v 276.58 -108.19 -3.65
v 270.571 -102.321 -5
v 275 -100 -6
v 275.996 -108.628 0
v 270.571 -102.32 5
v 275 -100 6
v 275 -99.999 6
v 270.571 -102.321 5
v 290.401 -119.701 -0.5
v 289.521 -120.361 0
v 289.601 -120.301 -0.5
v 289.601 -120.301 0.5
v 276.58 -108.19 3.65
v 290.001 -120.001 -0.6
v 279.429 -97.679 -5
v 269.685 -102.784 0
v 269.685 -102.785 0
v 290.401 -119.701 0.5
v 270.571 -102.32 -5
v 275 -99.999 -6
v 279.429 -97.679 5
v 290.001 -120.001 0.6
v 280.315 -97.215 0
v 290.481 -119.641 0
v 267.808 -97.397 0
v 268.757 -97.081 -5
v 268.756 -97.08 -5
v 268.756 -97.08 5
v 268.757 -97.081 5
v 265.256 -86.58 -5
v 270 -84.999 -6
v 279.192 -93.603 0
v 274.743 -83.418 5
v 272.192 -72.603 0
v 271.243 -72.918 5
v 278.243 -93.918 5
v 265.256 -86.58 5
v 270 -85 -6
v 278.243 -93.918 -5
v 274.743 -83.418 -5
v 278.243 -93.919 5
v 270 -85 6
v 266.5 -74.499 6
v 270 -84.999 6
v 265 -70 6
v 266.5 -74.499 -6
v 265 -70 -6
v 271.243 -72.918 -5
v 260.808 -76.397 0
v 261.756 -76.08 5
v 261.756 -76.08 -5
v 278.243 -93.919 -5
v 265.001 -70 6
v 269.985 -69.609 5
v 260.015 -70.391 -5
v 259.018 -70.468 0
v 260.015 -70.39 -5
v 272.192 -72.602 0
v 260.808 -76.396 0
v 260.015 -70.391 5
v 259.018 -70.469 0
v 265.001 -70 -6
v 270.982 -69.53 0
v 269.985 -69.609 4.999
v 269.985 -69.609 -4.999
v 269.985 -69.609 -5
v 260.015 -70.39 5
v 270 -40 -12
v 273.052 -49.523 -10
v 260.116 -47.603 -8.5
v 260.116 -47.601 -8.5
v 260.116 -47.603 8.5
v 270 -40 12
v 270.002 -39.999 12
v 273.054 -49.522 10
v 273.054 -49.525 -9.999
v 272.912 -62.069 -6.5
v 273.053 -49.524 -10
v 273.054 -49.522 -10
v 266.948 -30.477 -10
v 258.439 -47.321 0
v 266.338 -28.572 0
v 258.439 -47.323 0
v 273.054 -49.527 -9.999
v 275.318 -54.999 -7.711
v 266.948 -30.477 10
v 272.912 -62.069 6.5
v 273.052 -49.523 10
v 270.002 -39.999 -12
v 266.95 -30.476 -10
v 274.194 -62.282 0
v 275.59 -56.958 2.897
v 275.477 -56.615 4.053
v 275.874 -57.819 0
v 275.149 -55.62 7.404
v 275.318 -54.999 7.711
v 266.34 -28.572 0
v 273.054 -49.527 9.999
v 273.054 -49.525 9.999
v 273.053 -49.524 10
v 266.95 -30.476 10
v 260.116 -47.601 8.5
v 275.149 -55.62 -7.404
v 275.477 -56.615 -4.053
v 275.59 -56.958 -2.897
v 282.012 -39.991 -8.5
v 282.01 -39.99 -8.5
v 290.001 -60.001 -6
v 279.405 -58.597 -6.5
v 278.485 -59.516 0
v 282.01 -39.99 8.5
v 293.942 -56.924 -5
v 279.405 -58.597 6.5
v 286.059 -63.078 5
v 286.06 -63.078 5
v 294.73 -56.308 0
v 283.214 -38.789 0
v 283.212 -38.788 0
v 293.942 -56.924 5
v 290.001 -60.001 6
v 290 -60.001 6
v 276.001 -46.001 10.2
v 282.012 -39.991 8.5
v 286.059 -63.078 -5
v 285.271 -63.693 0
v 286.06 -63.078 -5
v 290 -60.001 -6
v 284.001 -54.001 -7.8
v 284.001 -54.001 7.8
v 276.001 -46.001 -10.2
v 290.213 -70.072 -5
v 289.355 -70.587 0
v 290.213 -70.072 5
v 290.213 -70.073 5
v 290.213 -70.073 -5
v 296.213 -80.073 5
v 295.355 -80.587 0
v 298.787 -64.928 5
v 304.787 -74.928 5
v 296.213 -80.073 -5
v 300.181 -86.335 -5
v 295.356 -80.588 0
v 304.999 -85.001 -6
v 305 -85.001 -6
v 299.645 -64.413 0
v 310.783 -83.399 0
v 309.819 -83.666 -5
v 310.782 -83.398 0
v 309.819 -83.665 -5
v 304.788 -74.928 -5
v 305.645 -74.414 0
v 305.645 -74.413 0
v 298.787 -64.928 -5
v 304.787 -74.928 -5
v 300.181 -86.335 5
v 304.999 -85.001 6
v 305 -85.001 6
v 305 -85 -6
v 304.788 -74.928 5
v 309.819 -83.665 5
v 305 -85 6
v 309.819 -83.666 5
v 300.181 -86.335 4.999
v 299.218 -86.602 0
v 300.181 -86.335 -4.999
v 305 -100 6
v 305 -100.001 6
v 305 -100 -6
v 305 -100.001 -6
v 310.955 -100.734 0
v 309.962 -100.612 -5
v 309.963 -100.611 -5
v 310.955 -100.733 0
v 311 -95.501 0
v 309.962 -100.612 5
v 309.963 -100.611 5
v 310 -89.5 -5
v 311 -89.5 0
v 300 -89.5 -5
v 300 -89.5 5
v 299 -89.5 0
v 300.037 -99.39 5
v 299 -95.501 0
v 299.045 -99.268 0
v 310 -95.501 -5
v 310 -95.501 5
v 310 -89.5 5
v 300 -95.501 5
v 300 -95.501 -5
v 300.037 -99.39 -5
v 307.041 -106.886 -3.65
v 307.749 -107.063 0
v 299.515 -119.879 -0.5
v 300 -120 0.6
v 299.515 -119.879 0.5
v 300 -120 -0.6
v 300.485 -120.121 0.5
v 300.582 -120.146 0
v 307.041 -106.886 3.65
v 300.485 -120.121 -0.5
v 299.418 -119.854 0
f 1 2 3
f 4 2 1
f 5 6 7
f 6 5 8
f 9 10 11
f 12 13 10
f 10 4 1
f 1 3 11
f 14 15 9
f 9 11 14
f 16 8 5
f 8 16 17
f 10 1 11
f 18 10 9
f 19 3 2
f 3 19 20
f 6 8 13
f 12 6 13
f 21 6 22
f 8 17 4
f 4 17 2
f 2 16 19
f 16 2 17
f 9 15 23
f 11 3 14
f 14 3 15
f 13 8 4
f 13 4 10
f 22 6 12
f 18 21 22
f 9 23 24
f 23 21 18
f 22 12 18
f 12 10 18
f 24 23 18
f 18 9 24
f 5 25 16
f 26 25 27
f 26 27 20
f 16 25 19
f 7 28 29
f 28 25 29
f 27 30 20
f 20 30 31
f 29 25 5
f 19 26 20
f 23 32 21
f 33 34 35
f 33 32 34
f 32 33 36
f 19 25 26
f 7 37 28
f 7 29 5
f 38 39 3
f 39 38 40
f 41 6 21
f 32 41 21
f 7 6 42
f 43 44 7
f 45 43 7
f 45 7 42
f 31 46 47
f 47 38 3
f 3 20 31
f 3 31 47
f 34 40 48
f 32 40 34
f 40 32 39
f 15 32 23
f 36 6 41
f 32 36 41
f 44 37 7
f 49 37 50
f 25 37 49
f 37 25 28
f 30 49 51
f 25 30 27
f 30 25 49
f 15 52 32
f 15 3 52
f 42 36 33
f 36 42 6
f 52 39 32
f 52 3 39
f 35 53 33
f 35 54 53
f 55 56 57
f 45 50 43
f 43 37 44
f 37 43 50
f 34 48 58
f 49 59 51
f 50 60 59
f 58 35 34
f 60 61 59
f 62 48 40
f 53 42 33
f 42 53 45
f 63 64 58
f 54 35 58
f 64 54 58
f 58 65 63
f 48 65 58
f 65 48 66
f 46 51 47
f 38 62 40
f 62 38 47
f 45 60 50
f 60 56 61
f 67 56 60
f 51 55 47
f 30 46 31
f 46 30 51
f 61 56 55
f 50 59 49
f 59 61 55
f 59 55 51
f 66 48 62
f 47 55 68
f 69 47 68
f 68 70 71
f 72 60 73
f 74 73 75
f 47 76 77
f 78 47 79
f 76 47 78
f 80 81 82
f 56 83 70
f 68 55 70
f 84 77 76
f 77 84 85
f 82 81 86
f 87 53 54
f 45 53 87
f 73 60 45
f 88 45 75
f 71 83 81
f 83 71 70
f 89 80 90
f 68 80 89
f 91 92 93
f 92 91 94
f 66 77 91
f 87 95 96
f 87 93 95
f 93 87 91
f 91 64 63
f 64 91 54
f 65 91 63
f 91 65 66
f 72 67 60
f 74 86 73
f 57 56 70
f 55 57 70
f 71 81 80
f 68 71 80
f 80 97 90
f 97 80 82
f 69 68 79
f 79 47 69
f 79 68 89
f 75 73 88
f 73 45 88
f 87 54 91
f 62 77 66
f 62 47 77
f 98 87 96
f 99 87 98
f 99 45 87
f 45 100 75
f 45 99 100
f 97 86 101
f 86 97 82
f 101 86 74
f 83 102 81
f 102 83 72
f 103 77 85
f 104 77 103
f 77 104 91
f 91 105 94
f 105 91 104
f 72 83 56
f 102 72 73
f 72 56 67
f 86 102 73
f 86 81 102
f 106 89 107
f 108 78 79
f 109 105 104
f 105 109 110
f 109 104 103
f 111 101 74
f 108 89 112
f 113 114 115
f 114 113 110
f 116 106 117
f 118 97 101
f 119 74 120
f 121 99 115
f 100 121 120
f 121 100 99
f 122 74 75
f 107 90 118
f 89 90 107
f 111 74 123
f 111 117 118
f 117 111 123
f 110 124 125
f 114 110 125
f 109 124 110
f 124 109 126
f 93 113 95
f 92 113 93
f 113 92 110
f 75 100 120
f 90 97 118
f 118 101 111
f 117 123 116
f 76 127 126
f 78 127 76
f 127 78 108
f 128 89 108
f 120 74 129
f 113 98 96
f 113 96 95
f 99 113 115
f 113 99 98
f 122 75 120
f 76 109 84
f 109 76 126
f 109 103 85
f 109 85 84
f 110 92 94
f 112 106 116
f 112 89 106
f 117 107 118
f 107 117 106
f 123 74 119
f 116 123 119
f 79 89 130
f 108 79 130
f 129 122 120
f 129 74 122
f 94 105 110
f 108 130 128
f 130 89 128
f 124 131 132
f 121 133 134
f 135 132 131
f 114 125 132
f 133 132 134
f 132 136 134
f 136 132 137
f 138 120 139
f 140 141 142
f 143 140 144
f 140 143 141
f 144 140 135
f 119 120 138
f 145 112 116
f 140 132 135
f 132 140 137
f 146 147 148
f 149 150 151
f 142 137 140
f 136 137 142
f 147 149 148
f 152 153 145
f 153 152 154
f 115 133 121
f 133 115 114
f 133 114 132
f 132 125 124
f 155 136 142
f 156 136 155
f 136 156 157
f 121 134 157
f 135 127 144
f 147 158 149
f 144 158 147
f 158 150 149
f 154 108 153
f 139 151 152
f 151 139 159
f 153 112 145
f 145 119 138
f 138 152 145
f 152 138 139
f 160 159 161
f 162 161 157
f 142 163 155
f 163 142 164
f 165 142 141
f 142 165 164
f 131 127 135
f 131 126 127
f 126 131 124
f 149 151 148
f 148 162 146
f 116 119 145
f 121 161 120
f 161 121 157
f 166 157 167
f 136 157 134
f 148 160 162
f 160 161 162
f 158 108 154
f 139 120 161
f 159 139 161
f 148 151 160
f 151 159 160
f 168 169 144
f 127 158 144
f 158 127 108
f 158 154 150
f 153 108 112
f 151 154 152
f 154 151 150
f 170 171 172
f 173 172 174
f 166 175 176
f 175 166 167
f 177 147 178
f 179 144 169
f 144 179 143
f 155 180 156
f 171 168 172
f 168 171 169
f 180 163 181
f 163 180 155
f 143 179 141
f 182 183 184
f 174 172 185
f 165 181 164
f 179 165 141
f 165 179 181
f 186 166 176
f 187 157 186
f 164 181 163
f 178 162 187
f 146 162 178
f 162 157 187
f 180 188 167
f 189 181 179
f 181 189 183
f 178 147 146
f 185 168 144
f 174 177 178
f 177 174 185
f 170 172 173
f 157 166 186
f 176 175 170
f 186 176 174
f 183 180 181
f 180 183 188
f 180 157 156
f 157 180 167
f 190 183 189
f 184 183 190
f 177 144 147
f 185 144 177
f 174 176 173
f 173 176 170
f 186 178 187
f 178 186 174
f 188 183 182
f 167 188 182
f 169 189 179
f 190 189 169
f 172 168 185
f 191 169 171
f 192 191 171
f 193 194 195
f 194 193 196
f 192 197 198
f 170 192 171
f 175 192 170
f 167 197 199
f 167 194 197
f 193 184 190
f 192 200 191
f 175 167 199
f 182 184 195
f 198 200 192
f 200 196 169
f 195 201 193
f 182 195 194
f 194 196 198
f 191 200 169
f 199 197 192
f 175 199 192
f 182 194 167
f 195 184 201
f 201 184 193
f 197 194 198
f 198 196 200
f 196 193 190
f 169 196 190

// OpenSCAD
Leg = [
    [290,  -120,0,[0.1,0.1,0-1]], //claw
  [275,  -100,0,[1,1,1]],// Tarsomeres
  [270,  -85,0,[1,1,1]],// Tarsomeres
  [265,  -70,0,[1,1,1]],// Tarsomeres

  [270,-40, 0, [2,2,2]],//Tarsus
  [290,  -60,0,[1,1,1]],// Tarsomeres
  [305,  -85,0,[1,1,1]],// Tarsomeres
  [305,  -100,0,[1,1,1]],// Tarsomeres
 [300,  -120,0,[0.1,0.1,0-1]], //claw
];


profile = [
  [5, 5],
  [0,6],
[-5, 5],
[-6,0],
[-5, -5],
[0,-6],
[5, -5],
[6,0]
];


bodypart ( profile, Leg );
    

module bodypart(profile, List, grove=1,lrp1=0.3,lrp2=0.7) {
    lrp0=0;
    lrp3=1;
   sth = 0.001;
  for(i = [0: len(List) - 2]) {
    hull() {
      if(i == 0) {
          
color("red")
ttranslate(List[i]) rotate(getangle(v(i,List)))  scale(lerp(List[i][3],List[i+1][3],lrp0)) scale(grove)  linear_extrude(height = sth) polygon(profile);
ttranslate(lerp(List[i ],List[i + 1],lrp1)) rotate(getangle(v(i,List) ) )    scale(lerp(List[i][3],List[i+1][3],lrp1)) linear_extrude(height = sth) polygon(profile);
ttranslate(lerp(List[i ],List[i + 1],lrp2)) rotate(getangle(v(i,List) ) )    scale(lerp(List[i][3],List[i+1][3],lrp2)) linear_extrude(height = sth) polygon(profile);

color("green")
ttranslate(List[i + 1]) rotate((getangle(v(i,List)) + getangle(v(i+1,List))) / 2) scale(lerp(List[i][3],List[i+1][3],lrp3))  scale(grove)  linear_extrude(height = sth) polygon(profile);
      
} else if(i == len(List) - 2) {

color("red")
ttranslate(List[i ])  rotate((getangle(v(i-1,List)) + getangle(v(i,List))) / 2)   scale(lerp(List[i][3],List[i+1][3],lrp0)) scale(grove)  linear_extrude(height = sth) polygon(profile);


ttranslate(lerp(List[i ],List[i + 1],lrp1)) rotate(getangle(v(i,List) ) )    scale(lerp(List[i][3],List[i+1][3],lrp1)) linear_extrude(height = sth) polygon(profile);
ttranslate(lerp(List[i ],List[i + 1],lrp2)) rotate(getangle(v(i,List) ) )    scale(lerp(List[i][3],List[i+1][3],lrp2)) linear_extrude(height = sth) polygon(profile);

color("green")
ttranslate(List[i+1]) rotate(getangle(v(i,List))) scale(lerp(List[i][3],List[i+1][3],lrp3))  scale(grove)  linear_extrude(height = sth) polygon(profile);

      } 
 else {
echo(getangle(v(i,List)));
color("red")
ttranslate(List[i ])  rotate((getangle(v(i-1,List)) + getangle(v(i,List))) / 2)   scale(lerp(List[i][3],List[i+1][3],lrp0)) scale(grove)  linear_extrude(height = sth) polygon(profile);


ttranslate(lerp(List[i ],List[i + 1],lrp1)) rotate(getangle(v(i,List) ) )    scale(lerp(List[i][3],List[i+1][3],lrp1)) linear_extrude(height = sth) polygon(profile);
ttranslate(lerp(List[i ],List[i + 1],lrp2)) rotate(getangle(v(i,List) ) )    scale(lerp(List[i][3],List[i+1][3],lrp2))  linear_extrude(height = sth) polygon(profile);

color("green")
ttranslate(List[i + 1]) rotate((getangle(v(i,List)) + getangle(v(i+1,List))) / 2)scale(lerp(List[i][3],List[i+1][3],lrp3))   scale(grove)  linear_extrude(height = sth) polygon(profile);
 
     }
    }
  }
}
module ttranslate(v){
          for (j=[0:$children-1]) 
      translate(t(v))  children(j);
    }
    
function getangle(v) = (len(v) == 3||len(v) == 4) ? [0, 90, 0] + geteuler(lim3(1, v)): [90, 0, 0] + [0, 0, -atan2(v[0], v[1])];
function lerp(start,end,bias ) = (end * bias + start * (1 - bias));
function geteuler(v) = [0, -asin(v[2]), atan2(v2xy(v)[1], v2xy(v)[0])]; //Euler angles from Vec3
function v2xy(v) = lim3(1, [v[0], v[1], 0]); // down projection xyz2xy
function lim3(l, v) = v / len3(v) * l; // normalize Vec37Vec4 to magnitude l
function len3(v) = sqrt(pow(v[0], 2) + pow(v[1], 2) + pow(v[2], 2)); // find magnitude of Vec3
function v(i,v)=v[i+1]-v[i]; // vec3 from polyline segment
function t(v) = [v[0], v[1], v[2]];// purge vec4... down to vec3 (for translate to play nice)
